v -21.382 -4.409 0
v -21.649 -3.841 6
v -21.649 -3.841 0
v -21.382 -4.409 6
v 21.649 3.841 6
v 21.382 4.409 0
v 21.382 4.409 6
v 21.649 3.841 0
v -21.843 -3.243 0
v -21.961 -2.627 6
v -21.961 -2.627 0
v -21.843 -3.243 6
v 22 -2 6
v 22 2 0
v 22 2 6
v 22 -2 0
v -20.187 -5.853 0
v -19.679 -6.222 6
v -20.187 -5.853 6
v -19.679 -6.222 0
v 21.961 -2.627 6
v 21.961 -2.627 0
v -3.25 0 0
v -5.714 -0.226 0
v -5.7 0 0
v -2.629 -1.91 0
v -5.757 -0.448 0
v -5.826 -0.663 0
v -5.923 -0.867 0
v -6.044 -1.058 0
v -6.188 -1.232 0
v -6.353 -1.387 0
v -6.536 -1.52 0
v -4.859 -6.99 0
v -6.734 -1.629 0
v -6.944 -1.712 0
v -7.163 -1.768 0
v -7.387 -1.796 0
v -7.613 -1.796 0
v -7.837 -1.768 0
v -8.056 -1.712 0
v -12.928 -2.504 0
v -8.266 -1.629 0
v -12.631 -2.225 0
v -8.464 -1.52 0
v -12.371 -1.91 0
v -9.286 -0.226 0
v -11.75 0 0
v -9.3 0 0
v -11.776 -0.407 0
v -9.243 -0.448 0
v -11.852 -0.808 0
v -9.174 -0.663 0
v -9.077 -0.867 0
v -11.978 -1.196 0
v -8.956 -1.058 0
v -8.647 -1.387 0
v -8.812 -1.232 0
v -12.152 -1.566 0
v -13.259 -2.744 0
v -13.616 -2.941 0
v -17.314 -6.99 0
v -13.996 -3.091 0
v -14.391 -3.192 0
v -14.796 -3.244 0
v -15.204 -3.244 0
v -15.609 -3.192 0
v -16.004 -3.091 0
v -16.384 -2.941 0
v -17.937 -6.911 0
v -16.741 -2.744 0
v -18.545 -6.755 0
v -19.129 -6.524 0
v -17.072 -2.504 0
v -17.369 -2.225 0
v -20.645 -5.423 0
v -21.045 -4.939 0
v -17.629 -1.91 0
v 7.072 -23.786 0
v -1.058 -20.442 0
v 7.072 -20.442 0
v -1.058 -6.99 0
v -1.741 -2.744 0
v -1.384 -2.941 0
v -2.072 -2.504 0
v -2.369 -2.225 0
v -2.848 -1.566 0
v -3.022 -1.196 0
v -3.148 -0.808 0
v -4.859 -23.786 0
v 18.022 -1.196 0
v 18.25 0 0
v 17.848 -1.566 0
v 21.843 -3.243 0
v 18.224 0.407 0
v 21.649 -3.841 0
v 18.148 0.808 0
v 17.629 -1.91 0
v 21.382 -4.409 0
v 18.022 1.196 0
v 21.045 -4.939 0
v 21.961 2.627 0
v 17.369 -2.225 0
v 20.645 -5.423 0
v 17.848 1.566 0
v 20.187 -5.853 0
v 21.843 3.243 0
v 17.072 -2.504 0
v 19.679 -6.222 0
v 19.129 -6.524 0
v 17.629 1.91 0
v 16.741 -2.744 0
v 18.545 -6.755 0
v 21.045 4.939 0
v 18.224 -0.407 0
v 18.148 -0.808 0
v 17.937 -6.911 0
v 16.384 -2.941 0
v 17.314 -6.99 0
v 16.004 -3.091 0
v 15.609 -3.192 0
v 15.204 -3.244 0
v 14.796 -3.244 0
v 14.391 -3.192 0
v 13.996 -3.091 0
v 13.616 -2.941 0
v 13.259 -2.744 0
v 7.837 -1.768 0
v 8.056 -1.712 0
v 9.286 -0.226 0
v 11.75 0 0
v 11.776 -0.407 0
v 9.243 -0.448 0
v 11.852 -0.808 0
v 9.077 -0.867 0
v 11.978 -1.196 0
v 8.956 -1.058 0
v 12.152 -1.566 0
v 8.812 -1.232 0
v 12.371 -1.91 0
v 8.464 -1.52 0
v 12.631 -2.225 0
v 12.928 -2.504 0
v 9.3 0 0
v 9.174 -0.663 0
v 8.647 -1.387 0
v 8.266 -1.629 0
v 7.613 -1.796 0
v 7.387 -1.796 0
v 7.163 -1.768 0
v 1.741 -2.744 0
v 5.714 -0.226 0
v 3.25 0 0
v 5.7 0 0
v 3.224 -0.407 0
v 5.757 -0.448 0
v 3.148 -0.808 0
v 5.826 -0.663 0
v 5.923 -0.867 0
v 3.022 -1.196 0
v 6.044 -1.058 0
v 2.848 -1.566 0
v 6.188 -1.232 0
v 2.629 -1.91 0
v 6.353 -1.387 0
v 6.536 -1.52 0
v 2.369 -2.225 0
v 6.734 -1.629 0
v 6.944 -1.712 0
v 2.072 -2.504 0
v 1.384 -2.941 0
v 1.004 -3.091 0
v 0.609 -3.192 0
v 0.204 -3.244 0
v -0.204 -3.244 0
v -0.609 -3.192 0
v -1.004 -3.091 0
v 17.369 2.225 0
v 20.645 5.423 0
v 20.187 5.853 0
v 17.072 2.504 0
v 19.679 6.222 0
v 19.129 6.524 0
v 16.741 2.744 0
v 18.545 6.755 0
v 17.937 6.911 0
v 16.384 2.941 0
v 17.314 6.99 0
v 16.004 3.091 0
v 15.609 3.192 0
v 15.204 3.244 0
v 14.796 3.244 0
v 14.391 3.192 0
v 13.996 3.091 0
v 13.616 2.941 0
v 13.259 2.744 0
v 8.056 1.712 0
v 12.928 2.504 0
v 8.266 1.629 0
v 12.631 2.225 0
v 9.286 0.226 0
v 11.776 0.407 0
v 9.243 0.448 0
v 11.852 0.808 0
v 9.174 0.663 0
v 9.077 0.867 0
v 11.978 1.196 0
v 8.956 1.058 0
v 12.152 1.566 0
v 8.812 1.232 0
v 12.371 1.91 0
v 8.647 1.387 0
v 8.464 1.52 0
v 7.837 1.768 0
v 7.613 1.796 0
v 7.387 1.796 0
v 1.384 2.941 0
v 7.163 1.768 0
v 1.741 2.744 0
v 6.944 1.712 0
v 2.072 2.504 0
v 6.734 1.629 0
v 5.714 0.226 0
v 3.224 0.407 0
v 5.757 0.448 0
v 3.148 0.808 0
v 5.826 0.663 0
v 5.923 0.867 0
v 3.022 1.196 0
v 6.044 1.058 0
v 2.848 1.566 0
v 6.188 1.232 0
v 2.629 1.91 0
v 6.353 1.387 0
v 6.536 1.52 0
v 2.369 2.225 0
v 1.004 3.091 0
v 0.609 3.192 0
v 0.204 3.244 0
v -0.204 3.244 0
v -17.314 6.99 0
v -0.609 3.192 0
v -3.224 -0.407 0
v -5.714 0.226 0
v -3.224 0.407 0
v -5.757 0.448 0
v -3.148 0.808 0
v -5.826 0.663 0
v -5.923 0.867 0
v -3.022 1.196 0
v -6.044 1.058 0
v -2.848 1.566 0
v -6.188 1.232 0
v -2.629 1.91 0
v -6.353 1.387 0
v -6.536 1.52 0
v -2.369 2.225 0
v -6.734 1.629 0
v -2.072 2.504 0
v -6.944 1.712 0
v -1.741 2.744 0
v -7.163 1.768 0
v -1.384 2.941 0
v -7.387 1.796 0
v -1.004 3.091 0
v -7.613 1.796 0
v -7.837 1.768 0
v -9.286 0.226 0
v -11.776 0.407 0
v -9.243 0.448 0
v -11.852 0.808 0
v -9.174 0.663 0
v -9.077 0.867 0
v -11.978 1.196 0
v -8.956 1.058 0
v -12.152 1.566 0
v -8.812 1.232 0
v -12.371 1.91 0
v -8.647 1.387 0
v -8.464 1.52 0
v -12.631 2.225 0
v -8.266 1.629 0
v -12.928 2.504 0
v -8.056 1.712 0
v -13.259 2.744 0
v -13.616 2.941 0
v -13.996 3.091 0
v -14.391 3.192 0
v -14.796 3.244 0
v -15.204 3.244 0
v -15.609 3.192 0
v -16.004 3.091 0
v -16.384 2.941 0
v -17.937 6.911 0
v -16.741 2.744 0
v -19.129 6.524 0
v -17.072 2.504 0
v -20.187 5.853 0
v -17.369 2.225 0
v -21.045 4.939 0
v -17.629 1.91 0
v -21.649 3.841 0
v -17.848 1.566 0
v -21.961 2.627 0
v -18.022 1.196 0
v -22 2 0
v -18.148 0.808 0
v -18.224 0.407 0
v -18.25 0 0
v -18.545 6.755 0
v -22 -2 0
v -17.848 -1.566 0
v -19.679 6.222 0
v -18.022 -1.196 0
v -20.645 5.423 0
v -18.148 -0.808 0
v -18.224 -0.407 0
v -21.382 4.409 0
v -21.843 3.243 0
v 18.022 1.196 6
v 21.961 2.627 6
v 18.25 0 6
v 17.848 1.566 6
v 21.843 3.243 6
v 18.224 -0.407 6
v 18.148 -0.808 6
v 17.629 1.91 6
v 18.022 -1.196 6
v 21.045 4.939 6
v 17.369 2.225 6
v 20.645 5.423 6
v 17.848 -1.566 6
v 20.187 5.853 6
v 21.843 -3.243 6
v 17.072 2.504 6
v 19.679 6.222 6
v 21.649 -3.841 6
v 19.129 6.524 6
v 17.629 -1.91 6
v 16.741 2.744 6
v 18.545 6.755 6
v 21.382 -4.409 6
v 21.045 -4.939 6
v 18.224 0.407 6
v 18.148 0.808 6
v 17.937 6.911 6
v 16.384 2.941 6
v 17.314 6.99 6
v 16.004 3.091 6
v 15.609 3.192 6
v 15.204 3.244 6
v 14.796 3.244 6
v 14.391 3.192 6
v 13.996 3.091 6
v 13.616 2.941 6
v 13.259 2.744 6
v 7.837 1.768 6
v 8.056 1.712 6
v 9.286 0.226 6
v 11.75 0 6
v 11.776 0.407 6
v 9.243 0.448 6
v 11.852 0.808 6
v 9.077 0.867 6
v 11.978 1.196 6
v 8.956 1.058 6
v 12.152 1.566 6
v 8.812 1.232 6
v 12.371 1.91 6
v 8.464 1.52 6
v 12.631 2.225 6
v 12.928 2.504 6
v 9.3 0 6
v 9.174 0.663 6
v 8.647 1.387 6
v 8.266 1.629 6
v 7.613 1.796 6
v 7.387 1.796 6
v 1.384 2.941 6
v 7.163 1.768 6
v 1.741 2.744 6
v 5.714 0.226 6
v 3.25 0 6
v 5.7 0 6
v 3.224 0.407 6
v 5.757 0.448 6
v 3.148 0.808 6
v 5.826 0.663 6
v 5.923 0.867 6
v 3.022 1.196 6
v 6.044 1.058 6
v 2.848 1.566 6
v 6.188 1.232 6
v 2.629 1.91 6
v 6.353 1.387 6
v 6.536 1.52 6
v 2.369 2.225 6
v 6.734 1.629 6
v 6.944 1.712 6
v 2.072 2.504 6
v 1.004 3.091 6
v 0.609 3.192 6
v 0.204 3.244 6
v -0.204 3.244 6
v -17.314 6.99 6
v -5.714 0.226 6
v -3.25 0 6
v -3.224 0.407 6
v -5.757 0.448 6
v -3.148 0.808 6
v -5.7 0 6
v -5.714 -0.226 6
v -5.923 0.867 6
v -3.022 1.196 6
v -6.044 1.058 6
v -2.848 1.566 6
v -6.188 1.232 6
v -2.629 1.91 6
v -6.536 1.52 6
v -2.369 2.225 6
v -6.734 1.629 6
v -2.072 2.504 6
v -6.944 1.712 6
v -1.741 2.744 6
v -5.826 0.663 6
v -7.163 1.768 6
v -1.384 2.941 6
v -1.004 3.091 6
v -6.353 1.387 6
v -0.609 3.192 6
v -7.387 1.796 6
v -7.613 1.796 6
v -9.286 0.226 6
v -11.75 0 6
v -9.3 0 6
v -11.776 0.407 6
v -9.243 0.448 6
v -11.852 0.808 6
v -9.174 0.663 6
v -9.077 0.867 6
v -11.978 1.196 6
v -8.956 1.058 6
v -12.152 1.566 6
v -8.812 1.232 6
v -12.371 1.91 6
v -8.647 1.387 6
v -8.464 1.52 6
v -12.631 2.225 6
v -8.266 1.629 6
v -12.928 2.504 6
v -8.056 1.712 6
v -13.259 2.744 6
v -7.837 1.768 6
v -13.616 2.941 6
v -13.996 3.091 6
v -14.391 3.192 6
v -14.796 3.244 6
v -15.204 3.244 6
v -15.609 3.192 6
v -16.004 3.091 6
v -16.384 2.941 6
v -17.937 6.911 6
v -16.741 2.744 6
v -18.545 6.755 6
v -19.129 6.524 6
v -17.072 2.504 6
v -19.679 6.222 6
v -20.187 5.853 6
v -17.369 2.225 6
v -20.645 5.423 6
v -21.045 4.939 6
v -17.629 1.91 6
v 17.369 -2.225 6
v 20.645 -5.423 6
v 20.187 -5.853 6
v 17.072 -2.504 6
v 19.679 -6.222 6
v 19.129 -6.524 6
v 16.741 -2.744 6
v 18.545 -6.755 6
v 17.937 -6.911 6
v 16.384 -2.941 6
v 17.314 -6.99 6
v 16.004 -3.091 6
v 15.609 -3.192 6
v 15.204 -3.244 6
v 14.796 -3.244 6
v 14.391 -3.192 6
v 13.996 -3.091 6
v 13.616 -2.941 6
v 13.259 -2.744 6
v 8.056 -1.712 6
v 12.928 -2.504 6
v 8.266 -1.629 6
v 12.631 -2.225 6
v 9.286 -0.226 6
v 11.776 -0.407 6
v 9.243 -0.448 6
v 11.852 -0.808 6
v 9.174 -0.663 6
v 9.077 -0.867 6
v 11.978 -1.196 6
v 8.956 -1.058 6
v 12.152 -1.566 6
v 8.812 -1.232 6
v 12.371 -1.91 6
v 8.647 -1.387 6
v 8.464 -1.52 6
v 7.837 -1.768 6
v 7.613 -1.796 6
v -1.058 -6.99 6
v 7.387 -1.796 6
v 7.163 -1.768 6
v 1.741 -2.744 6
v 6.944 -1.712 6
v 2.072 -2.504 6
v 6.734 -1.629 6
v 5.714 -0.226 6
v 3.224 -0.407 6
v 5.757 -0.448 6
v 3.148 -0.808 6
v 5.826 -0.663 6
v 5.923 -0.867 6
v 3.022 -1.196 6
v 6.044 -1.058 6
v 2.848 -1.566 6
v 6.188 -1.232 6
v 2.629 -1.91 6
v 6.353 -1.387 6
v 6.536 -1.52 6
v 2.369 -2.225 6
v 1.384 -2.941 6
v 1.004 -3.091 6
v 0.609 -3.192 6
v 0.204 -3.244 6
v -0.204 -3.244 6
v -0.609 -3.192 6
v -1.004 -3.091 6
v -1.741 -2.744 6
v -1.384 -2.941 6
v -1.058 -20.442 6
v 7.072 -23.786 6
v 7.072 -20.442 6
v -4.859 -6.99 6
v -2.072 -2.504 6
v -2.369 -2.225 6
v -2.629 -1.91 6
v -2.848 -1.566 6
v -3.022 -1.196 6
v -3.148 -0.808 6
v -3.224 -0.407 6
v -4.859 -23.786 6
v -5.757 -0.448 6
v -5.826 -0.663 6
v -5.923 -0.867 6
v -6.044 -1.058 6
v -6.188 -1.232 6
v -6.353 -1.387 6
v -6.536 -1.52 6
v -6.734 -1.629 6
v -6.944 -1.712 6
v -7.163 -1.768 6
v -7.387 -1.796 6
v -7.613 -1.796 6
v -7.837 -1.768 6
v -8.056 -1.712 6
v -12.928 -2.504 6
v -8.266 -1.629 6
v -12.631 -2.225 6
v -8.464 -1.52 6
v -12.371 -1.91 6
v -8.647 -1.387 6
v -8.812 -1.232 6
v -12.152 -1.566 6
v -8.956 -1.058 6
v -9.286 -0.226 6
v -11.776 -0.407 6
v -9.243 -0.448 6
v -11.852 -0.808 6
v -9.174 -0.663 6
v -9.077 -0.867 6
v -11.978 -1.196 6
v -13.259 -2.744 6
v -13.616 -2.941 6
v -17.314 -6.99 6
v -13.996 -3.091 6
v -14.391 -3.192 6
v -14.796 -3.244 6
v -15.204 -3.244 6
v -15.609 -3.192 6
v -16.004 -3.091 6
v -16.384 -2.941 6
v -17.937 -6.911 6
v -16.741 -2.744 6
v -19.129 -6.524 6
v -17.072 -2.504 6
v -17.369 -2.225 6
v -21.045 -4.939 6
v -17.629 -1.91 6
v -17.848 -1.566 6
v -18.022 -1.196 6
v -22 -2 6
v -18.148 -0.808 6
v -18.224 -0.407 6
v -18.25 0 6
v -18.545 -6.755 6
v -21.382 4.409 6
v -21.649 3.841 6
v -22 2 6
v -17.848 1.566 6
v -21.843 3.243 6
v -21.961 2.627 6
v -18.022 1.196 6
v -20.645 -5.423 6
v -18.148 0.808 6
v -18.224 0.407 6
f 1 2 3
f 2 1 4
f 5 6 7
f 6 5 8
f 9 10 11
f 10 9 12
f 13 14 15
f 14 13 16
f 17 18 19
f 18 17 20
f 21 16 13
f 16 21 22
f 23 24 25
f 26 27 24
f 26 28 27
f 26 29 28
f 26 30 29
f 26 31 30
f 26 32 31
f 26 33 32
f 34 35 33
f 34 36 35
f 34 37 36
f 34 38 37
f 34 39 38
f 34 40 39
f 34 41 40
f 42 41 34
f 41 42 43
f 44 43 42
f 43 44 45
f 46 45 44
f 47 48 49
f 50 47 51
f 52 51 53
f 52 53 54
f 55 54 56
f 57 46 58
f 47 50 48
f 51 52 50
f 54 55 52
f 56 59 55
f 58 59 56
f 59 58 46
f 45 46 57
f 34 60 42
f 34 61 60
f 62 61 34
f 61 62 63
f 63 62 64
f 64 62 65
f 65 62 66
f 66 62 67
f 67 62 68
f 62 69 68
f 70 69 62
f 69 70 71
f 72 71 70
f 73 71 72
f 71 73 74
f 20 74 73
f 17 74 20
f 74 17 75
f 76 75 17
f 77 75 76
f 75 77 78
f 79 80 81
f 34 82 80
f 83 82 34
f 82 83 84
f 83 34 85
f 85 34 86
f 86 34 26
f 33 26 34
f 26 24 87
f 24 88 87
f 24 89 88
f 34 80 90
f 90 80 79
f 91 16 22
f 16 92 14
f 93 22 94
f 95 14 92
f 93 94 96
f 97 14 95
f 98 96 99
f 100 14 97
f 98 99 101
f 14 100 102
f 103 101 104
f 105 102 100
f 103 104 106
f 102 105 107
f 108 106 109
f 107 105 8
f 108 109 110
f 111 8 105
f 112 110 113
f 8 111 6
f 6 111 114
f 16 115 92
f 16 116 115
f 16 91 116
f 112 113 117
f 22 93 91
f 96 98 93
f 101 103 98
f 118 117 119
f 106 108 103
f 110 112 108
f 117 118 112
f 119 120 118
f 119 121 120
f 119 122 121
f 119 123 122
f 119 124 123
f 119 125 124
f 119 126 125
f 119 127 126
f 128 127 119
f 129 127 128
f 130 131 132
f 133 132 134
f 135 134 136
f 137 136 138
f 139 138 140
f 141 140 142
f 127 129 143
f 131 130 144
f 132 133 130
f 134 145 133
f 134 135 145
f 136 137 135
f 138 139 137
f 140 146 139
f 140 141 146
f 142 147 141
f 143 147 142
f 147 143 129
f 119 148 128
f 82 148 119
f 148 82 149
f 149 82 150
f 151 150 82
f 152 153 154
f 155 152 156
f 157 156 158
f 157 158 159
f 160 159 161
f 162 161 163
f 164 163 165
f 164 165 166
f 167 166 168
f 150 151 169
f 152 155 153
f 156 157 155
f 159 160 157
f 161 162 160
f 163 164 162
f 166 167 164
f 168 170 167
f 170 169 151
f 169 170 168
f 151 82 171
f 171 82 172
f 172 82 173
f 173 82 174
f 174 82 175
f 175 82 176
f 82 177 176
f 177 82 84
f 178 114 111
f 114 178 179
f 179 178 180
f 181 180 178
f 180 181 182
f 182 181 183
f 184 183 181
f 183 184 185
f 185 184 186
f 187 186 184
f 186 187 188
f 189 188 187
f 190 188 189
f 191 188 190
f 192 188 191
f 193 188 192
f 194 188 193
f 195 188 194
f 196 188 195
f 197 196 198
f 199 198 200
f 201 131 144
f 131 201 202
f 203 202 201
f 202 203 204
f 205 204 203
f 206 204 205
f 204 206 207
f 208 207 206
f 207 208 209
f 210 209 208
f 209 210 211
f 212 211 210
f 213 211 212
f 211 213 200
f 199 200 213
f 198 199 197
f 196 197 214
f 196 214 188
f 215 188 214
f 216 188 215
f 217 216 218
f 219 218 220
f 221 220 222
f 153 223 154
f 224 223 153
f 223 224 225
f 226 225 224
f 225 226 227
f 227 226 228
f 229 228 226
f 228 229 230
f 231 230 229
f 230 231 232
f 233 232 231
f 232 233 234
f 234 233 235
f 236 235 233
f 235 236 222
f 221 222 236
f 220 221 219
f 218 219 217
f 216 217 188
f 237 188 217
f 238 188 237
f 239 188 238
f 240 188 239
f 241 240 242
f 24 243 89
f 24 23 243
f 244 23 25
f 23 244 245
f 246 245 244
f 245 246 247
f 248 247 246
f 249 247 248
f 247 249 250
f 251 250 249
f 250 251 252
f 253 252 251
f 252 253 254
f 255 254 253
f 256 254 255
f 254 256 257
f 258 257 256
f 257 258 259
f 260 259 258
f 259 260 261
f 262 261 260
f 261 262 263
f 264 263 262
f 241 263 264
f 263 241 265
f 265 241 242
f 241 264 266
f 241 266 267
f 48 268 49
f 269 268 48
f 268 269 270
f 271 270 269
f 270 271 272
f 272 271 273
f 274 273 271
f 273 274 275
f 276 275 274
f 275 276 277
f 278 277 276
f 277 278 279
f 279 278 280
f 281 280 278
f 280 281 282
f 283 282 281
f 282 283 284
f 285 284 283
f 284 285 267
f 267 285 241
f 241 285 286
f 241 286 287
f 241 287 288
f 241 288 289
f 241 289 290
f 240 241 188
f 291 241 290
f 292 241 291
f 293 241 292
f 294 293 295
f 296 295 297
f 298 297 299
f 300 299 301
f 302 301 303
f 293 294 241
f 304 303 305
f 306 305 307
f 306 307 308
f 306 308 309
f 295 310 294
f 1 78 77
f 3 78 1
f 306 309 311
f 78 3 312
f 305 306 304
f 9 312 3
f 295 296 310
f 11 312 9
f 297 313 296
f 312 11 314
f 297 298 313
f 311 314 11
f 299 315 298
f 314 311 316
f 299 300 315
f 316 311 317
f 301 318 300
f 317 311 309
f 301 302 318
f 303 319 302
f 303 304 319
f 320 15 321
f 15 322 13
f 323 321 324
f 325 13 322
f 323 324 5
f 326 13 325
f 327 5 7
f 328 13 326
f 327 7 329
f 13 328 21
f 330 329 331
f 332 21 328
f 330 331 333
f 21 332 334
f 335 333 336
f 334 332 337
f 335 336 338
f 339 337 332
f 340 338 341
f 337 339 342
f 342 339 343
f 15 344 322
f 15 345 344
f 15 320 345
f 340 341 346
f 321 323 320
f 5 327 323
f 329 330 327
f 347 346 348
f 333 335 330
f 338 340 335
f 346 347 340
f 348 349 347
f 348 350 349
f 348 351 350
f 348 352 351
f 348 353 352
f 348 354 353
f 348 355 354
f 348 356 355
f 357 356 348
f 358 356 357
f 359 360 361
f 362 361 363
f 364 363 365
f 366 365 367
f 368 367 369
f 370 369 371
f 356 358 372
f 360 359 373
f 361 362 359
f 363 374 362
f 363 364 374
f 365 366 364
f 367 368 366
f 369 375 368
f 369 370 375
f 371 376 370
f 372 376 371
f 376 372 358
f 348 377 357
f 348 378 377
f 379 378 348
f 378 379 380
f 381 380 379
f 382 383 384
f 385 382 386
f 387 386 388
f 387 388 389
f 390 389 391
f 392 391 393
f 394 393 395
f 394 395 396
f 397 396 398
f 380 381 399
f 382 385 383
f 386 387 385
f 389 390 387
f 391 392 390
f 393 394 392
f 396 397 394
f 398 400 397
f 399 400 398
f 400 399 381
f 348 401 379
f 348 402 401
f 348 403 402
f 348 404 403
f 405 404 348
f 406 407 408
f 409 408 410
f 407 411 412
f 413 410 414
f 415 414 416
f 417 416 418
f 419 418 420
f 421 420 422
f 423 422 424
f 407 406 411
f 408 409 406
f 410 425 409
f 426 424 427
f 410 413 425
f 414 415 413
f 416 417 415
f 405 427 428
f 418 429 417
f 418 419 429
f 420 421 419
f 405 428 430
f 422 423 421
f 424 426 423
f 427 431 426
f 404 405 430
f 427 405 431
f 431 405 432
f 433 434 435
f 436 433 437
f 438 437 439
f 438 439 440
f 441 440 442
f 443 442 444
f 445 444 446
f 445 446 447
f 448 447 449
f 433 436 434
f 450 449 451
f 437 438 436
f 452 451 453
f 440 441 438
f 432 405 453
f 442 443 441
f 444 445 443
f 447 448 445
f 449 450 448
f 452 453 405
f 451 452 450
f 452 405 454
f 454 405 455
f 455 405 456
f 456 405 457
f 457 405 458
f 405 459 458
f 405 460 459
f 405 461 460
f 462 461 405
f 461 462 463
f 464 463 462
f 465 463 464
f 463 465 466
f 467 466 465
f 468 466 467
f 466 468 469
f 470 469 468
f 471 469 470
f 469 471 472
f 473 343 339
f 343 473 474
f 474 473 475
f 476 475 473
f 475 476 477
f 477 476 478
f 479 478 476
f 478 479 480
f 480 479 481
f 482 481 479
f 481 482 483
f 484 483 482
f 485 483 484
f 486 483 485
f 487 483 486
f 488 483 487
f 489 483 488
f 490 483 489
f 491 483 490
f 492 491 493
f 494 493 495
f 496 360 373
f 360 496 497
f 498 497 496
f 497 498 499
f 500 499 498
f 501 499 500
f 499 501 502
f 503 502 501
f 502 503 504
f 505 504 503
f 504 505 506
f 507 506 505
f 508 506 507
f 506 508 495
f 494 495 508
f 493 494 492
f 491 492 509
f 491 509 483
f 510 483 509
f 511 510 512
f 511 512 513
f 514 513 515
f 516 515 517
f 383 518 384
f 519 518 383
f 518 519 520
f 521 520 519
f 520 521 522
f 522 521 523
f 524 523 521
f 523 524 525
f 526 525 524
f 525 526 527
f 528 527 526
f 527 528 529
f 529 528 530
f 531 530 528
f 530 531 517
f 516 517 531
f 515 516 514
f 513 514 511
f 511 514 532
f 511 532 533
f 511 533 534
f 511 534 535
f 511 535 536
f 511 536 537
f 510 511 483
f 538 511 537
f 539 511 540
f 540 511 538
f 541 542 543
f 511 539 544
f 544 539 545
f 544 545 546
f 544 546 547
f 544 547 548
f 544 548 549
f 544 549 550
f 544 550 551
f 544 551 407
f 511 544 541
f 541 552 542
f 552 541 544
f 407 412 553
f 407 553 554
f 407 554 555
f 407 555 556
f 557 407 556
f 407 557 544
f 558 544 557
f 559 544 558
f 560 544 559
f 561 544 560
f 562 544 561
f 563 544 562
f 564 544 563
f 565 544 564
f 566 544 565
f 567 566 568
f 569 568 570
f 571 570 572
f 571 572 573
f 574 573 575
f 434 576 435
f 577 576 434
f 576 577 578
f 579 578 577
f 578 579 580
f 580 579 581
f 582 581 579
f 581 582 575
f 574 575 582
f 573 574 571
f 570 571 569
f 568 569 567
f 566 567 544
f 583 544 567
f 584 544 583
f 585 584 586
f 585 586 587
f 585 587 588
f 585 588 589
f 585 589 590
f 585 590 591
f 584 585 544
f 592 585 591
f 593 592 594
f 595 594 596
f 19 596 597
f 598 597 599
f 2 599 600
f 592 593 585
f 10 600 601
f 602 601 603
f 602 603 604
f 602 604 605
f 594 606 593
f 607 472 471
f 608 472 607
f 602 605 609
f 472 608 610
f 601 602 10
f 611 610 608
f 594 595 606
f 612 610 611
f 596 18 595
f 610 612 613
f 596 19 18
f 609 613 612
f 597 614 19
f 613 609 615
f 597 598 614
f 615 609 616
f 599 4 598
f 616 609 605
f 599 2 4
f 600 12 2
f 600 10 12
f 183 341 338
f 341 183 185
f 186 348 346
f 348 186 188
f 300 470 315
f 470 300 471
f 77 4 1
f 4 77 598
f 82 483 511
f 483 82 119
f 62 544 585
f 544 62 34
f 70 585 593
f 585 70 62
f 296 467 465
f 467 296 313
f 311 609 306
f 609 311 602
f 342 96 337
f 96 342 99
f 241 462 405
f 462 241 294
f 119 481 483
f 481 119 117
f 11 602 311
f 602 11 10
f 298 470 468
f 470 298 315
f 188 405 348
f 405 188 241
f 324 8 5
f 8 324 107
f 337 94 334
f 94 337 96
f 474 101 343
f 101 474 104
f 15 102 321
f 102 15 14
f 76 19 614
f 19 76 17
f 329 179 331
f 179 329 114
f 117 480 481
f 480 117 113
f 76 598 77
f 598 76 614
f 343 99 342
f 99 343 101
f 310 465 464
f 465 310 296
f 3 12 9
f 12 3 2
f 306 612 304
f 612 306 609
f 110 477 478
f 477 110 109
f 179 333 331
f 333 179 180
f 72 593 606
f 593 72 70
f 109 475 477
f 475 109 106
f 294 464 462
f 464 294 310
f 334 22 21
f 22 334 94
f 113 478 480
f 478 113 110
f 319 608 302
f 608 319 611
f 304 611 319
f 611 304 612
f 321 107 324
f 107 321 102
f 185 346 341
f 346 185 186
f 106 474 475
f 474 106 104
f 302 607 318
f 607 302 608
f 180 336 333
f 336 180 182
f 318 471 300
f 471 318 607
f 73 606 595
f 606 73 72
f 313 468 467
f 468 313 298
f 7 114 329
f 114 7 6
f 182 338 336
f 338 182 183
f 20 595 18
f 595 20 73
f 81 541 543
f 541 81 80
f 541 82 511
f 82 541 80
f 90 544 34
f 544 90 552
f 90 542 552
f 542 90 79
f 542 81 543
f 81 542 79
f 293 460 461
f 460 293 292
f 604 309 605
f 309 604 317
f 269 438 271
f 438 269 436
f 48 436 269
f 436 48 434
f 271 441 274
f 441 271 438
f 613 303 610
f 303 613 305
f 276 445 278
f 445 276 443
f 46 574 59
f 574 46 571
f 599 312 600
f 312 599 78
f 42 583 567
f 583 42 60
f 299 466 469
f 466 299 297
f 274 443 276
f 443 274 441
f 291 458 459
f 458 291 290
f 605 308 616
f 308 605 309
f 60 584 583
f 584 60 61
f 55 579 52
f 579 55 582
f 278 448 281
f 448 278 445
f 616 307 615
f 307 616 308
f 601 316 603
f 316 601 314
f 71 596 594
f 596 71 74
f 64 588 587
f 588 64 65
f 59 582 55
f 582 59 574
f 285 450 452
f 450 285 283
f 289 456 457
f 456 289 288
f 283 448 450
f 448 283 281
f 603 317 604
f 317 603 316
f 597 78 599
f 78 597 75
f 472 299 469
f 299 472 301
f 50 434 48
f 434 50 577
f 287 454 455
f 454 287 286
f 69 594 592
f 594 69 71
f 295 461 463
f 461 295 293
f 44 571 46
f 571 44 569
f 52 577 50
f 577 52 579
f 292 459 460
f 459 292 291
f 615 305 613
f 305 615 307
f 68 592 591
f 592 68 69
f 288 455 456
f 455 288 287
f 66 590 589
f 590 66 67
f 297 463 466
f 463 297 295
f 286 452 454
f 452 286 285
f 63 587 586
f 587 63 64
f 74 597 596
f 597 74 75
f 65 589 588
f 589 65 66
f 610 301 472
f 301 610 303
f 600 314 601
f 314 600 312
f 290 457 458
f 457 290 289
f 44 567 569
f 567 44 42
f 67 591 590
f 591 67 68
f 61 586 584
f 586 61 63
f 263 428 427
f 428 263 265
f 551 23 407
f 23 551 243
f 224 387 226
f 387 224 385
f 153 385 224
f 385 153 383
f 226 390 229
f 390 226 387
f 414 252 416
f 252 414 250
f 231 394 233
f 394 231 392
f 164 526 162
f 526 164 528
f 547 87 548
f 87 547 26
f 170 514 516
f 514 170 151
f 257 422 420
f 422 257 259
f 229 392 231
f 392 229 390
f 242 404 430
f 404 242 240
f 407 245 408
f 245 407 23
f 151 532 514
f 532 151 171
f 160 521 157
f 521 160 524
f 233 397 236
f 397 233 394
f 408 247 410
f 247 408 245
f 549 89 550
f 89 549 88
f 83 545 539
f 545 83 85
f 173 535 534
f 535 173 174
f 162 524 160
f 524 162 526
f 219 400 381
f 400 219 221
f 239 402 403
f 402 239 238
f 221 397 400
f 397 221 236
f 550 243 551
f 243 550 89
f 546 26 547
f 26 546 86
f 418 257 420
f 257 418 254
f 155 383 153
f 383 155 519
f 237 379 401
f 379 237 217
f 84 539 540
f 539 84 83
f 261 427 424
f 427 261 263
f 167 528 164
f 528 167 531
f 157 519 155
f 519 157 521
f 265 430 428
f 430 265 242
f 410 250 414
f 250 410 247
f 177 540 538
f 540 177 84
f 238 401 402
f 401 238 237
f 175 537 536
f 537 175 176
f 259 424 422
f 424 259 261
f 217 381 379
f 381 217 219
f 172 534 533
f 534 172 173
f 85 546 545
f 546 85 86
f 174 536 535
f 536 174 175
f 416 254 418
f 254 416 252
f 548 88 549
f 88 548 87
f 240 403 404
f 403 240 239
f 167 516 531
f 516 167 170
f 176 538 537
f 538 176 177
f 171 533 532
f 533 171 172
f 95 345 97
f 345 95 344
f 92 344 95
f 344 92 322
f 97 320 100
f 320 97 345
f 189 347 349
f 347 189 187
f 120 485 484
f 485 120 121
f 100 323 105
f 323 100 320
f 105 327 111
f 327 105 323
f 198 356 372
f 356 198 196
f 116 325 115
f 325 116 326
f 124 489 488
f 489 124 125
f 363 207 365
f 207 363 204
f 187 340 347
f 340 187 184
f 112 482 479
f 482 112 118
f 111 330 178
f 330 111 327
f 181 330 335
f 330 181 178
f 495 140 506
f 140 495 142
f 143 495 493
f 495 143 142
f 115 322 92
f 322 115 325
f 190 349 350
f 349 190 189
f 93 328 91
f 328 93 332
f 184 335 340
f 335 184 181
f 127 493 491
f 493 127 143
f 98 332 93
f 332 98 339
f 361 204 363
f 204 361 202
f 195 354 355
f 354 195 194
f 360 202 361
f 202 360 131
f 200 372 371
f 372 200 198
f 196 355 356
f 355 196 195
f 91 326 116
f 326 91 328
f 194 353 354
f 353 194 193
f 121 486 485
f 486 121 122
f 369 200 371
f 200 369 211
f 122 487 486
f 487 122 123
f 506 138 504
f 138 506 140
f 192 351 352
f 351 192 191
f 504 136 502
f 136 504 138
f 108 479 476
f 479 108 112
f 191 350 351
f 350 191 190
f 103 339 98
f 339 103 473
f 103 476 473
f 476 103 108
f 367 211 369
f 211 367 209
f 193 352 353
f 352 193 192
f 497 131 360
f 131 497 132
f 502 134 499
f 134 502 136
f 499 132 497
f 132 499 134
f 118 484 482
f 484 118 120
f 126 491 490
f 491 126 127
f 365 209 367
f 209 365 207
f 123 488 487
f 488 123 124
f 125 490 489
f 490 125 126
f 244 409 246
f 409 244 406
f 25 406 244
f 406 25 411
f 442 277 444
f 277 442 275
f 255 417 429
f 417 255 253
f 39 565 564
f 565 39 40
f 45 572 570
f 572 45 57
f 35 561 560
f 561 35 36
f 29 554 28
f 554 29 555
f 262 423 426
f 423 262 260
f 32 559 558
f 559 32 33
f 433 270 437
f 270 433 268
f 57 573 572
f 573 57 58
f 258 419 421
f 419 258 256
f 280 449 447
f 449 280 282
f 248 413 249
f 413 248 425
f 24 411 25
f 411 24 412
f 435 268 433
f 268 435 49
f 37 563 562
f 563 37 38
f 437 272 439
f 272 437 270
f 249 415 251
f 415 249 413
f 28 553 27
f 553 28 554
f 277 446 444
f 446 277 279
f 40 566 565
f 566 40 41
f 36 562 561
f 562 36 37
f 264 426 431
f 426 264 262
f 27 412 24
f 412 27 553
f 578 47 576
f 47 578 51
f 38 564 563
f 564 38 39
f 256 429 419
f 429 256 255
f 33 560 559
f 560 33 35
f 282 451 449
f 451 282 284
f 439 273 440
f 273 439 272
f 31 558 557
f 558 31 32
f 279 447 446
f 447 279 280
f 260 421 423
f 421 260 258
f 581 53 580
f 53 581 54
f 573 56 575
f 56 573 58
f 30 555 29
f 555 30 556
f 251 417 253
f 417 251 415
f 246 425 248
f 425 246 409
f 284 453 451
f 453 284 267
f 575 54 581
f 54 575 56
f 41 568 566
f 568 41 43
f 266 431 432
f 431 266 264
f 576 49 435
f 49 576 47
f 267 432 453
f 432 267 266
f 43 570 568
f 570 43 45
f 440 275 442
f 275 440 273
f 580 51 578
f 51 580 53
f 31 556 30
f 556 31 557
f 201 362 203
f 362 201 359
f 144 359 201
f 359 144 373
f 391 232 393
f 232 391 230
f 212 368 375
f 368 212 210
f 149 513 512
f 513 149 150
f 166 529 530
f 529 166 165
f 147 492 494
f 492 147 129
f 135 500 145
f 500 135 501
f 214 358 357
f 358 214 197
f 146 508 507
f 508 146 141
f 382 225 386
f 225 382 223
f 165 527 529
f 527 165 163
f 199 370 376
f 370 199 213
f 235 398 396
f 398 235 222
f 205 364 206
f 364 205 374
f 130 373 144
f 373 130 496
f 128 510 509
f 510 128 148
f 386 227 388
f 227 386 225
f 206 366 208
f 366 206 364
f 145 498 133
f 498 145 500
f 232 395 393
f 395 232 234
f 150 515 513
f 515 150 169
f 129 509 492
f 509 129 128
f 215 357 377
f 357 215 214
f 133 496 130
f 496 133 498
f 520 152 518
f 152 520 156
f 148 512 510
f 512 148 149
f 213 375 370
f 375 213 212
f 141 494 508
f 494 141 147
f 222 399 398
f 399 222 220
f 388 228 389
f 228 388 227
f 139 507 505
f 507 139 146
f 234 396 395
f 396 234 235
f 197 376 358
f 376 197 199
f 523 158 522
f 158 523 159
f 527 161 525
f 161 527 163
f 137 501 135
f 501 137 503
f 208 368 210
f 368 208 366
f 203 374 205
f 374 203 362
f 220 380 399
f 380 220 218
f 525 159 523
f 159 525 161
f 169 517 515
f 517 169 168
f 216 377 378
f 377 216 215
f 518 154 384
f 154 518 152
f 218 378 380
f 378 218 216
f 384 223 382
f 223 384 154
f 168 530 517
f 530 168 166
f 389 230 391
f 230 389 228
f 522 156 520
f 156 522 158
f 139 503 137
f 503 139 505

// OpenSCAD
$fn = 50;


difference() {
	union() {
		hull() {
			translate(v = [-17.0000000000, 2.0000000000, 0]) {
				cylinder(h = 6, r = 5);
			}
			translate(v = [17.0000000000, 2.0000000000, 0]) {
				cylinder(h = 6, r = 5);
			}
			translate(v = [-17.0000000000, -2.0000000000, 0]) {
				cylinder(h = 6, r = 5);
			}
			translate(v = [17.0000000000, -2.0000000000, 0]) {
				cylinder(h = 6, r = 5);
			}
		}
		translate(v = [0, -5, 0]) {
			linear_extrude(height = 6) {
				text(font = "DejaVu Sans Mono:style=Bold", halign = "center", size = 19.0000000000, text = "L", valign = "top");
			}
		}
	}
	union() {
		translate(v = [-15.0000000000, 0.0000000000, 0]) {
			translate(v = [0, 0, -100]) {
				cylinder(h = 200, r = 3.2500000000);
			}
		}
		translate(v = [0, 0, -100]) {
			cylinder(h = 200, r = 3.2500000000);
		}
		translate(v = [15.0000000000, 0.0000000000, 0]) {
			translate(v = [0, 0, -100]) {
				cylinder(h = 200, r = 3.2500000000);
			}
		}
		translate(v = [-15.0000000000, 0.0000000000, 0]) {
			translate(v = [0, 0, -100]) {
				cylinder(h = 200, r = 1.8000000000);
			}
		}
		translate(v = [-7.5000000000, 0.0000000000, 0]) {
			translate(v = [0, 0, -100]) {
				cylinder(h = 200, r = 1.8000000000);
			}
		}
		translate(v = [0, 0, -100]) {
			cylinder(h = 200, r = 1.8000000000);
		}
		translate(v = [7.5000000000, 0.0000000000, 0]) {
			translate(v = [0, 0, -100]) {
				cylinder(h = 200, r = 1.8000000000);
			}
		}
		translate(v = [15.0000000000, 0.0000000000, 0]) {
			translate(v = [0, 0, -100]) {
				cylinder(h = 200, r = 1.8000000000);
			}
		}
	}
}
